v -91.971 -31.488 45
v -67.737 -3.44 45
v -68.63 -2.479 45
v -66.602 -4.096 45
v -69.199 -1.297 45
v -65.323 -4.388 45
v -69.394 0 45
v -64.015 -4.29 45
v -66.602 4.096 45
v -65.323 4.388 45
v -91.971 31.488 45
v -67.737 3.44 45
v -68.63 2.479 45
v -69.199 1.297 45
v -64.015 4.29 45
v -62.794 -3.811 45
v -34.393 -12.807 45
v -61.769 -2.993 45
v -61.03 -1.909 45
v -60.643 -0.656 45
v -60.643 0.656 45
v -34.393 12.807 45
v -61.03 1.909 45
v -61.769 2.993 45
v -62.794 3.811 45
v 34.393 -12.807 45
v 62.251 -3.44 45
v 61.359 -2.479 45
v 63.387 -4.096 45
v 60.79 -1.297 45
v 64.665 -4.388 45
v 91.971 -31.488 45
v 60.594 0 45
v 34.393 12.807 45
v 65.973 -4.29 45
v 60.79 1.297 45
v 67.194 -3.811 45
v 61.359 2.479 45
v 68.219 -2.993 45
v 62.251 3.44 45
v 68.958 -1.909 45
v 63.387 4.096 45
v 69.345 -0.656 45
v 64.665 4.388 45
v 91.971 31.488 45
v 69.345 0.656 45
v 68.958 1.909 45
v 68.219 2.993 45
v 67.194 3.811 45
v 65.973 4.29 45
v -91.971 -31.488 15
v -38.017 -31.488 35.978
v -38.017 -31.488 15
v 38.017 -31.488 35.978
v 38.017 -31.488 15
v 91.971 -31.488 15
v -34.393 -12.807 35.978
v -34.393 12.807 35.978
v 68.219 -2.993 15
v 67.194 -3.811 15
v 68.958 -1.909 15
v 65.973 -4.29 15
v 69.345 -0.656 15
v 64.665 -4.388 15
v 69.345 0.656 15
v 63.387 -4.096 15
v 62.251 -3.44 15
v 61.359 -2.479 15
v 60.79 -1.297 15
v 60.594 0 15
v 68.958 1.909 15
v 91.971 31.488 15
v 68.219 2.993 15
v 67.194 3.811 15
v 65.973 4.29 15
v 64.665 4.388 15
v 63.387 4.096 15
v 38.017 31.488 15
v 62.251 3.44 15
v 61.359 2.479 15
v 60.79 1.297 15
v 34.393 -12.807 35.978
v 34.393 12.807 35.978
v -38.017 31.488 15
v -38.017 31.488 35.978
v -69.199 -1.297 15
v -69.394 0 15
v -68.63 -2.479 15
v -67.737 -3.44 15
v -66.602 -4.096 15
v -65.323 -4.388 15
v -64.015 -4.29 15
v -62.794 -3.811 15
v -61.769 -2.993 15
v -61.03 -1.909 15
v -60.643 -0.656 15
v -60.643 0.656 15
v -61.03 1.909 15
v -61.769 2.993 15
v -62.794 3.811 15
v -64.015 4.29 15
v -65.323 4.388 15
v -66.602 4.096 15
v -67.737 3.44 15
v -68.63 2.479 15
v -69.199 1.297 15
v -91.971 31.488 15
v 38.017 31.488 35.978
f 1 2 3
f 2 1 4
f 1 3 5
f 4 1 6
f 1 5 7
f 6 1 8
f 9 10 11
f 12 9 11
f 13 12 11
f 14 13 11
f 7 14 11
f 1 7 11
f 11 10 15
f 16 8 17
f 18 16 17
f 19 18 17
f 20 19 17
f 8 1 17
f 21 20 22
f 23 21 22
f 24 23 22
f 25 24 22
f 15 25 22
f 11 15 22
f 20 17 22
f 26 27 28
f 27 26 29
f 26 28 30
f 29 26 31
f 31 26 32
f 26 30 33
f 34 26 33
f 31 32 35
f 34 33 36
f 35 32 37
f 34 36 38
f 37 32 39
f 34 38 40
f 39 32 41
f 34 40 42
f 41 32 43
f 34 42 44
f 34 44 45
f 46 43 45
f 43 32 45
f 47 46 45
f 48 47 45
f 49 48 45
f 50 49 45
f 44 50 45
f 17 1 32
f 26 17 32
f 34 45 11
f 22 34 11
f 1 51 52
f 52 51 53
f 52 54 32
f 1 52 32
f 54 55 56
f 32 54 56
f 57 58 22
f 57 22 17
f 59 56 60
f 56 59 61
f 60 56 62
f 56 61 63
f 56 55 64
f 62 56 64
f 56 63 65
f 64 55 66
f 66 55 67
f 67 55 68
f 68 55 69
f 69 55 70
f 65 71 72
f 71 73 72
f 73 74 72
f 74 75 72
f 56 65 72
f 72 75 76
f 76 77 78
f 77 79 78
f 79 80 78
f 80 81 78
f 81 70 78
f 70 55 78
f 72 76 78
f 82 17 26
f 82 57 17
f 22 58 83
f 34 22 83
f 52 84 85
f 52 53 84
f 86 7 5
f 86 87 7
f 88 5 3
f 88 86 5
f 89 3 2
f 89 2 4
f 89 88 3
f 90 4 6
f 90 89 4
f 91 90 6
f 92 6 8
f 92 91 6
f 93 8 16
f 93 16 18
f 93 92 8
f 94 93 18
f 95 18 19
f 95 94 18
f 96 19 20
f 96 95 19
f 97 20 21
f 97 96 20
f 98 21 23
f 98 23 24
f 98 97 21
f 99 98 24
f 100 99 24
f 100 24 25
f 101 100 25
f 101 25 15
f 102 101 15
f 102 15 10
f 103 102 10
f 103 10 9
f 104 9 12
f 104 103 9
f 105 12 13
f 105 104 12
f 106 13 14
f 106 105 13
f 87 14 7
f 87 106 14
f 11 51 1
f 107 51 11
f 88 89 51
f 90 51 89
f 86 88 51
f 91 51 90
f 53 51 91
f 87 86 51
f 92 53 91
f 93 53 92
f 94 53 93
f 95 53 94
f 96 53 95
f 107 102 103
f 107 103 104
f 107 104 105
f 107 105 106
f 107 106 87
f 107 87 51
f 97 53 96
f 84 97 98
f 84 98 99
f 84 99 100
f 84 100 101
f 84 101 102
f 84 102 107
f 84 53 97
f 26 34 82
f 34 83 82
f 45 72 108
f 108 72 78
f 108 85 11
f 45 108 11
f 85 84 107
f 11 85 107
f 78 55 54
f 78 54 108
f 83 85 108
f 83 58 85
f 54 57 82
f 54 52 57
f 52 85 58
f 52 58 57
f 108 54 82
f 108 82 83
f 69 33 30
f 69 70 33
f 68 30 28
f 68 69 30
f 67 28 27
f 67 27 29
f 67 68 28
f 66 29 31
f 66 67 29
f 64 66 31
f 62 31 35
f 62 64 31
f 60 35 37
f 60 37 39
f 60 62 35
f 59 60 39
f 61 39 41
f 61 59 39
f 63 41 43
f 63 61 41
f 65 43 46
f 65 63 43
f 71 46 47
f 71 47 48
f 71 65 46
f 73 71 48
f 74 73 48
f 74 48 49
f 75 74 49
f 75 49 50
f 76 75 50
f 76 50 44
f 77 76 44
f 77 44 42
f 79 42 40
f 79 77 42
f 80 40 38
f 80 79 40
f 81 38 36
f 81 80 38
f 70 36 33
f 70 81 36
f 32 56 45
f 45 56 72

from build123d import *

# Parameters (mm, degrees)
F0_W      = 163.9416664839
F0_H      = 62.9752725363
F1_DEPTH  = 10
F2_DEPTH  = 20
F3_W      = 76.0346129537
F3_H      = 41.9552475214
F4_DEPTH  = 50
F5_DEPTH  = 10
F6_DEPTH  = 10
F7_DEPTH  = 10
F9_D      = 8.8
F11_D     = 8.8
F12_W     = 68.7855780125
F12_H     = 25.6147123873
F13_DEPTH = 25
F14_DEPTH = 10
F15_DEPTH = 10
F16_DEPTH = 5
F17_DEPTH = 5
F18_DEPTH = 15
F19_DEPTH = 5


with BuildPart() as f1:
    # F0 (on Top) → F1 (new body)
    with BuildSketch(Plane.XY):
        Rectangle(F0_W, F0_H)
    extrude(amount=F1_DEPTH)

    # F2 (add): a face of the model
    f2_faces = [f1.faces().sort_by_distance(p)[0] for p in [
        (0, 0, 10),
    ]]
    extrude(f2_faces, amount=F2_DEPTH)

    # F3 (on Front) → F4 (cut, symmetric)
    with BuildSketch(Plane.XZ):
        Rectangle(F3_W, F3_H)
    extrude(amount=F4_DEPTH, both=True, mode=Mode.SUBTRACT)

    # F5 (add): a face of the model
    f5_faces = [f1.faces().sort_by_distance(p)[0] for p in [
        (0, 0, 30),
    ]]
    extrude(f5_faces, amount=F5_DEPTH)

    # F6 (add): a face of the model
    f6_faces = [f1.faces().sort_by_distance(p)[0] for p in [
        (81.9708332419, 0, 20),
    ]]
    extrude(f6_faces, amount=F6_DEPTH)

    # F7 (add): a face of the model
    f7_faces = [f1.faces().sort_by_distance(p)[0] for p in [
        (-81.9708332419, 0, 20),
    ]]
    extrude(f7_faces, amount=F7_DEPTH)

    # F9 (through all)
    with Locations(Plane(origin=(0, 0, 0), x_dir=(1, 0, 0), z_dir=(0, 0, -1))):
        with Locations((-64.9940698594, 0)):
            Hole(F9_D / 2)

    # F11 (through all)
    with Locations(Plane(origin=(0, 0, 0), x_dir=(1, 0, 0), z_dir=(0, 0, -1))):
        with Locations((64.9940698594, 0)):
            Hole(F11_D / 2)

    # F12 (on face) → F13 (cut, symmetric)
    with BuildSketch(Plane(origin=(0, 0, 20.9776237607), x_dir=(1, 0, 0), z_dir=(0, 0, -1))):
        Rectangle(F12_W, F12_H)
    extrude(amount=F13_DEPTH, both=True, mode=Mode.SUBTRACT)

    # F14 (cut): a face of the model
    f14_faces = [f1.faces().sort_by_distance(p)[0] for p in [
        (-38.8465753115, 0, 0),
    ]]
    extrude(f14_faces, amount=-F14_DEPTH, mode=Mode.SUBTRACT)

    # F15 (cut): a face of the model
    f15_faces = [f1.faces().sort_by_distance(p)[0] for p in [
        (64.9940698594, -30.6583674335, 0),
    ]]
    extrude(f15_faces, amount=-F15_DEPTH, mode=Mode.SUBTRACT)

    # F16 (cut): a face of the model
    f16_faces = [f1.faces().sort_by_distance(p)[0] for p in [
        (64.9940698594, -30.6583674335, 10),
    ]]
    extrude(f16_faces, amount=-F16_DEPTH, mode=Mode.SUBTRACT)

    # F17 (cut): a face of the model
    f17_faces = [f1.faces().sort_by_distance(p)[0] for p in [
        (-38.8465753115, 0, 10),
    ]]
    extrude(f17_faces, amount=-F17_DEPTH, mode=Mode.SUBTRACT)

    # F18 (cut): a face of the model
    f18_faces = [f1.faces().sort_by_distance(p)[0] for p in [
        (37.0300300557, 0, 20.9776237607),
    ]]
    extrude(f18_faces, amount=-F18_DEPTH, mode=Mode.SUBTRACT)

    # F19 (add): a face of the model
    f19_faces = [f1.faces().sort_by_distance(p)[0] for p in [
        (0, 29.5434032158, 40),
    ]]
    extrude(f19_faces, amount=F19_DEPTH)


solid = f1.part
